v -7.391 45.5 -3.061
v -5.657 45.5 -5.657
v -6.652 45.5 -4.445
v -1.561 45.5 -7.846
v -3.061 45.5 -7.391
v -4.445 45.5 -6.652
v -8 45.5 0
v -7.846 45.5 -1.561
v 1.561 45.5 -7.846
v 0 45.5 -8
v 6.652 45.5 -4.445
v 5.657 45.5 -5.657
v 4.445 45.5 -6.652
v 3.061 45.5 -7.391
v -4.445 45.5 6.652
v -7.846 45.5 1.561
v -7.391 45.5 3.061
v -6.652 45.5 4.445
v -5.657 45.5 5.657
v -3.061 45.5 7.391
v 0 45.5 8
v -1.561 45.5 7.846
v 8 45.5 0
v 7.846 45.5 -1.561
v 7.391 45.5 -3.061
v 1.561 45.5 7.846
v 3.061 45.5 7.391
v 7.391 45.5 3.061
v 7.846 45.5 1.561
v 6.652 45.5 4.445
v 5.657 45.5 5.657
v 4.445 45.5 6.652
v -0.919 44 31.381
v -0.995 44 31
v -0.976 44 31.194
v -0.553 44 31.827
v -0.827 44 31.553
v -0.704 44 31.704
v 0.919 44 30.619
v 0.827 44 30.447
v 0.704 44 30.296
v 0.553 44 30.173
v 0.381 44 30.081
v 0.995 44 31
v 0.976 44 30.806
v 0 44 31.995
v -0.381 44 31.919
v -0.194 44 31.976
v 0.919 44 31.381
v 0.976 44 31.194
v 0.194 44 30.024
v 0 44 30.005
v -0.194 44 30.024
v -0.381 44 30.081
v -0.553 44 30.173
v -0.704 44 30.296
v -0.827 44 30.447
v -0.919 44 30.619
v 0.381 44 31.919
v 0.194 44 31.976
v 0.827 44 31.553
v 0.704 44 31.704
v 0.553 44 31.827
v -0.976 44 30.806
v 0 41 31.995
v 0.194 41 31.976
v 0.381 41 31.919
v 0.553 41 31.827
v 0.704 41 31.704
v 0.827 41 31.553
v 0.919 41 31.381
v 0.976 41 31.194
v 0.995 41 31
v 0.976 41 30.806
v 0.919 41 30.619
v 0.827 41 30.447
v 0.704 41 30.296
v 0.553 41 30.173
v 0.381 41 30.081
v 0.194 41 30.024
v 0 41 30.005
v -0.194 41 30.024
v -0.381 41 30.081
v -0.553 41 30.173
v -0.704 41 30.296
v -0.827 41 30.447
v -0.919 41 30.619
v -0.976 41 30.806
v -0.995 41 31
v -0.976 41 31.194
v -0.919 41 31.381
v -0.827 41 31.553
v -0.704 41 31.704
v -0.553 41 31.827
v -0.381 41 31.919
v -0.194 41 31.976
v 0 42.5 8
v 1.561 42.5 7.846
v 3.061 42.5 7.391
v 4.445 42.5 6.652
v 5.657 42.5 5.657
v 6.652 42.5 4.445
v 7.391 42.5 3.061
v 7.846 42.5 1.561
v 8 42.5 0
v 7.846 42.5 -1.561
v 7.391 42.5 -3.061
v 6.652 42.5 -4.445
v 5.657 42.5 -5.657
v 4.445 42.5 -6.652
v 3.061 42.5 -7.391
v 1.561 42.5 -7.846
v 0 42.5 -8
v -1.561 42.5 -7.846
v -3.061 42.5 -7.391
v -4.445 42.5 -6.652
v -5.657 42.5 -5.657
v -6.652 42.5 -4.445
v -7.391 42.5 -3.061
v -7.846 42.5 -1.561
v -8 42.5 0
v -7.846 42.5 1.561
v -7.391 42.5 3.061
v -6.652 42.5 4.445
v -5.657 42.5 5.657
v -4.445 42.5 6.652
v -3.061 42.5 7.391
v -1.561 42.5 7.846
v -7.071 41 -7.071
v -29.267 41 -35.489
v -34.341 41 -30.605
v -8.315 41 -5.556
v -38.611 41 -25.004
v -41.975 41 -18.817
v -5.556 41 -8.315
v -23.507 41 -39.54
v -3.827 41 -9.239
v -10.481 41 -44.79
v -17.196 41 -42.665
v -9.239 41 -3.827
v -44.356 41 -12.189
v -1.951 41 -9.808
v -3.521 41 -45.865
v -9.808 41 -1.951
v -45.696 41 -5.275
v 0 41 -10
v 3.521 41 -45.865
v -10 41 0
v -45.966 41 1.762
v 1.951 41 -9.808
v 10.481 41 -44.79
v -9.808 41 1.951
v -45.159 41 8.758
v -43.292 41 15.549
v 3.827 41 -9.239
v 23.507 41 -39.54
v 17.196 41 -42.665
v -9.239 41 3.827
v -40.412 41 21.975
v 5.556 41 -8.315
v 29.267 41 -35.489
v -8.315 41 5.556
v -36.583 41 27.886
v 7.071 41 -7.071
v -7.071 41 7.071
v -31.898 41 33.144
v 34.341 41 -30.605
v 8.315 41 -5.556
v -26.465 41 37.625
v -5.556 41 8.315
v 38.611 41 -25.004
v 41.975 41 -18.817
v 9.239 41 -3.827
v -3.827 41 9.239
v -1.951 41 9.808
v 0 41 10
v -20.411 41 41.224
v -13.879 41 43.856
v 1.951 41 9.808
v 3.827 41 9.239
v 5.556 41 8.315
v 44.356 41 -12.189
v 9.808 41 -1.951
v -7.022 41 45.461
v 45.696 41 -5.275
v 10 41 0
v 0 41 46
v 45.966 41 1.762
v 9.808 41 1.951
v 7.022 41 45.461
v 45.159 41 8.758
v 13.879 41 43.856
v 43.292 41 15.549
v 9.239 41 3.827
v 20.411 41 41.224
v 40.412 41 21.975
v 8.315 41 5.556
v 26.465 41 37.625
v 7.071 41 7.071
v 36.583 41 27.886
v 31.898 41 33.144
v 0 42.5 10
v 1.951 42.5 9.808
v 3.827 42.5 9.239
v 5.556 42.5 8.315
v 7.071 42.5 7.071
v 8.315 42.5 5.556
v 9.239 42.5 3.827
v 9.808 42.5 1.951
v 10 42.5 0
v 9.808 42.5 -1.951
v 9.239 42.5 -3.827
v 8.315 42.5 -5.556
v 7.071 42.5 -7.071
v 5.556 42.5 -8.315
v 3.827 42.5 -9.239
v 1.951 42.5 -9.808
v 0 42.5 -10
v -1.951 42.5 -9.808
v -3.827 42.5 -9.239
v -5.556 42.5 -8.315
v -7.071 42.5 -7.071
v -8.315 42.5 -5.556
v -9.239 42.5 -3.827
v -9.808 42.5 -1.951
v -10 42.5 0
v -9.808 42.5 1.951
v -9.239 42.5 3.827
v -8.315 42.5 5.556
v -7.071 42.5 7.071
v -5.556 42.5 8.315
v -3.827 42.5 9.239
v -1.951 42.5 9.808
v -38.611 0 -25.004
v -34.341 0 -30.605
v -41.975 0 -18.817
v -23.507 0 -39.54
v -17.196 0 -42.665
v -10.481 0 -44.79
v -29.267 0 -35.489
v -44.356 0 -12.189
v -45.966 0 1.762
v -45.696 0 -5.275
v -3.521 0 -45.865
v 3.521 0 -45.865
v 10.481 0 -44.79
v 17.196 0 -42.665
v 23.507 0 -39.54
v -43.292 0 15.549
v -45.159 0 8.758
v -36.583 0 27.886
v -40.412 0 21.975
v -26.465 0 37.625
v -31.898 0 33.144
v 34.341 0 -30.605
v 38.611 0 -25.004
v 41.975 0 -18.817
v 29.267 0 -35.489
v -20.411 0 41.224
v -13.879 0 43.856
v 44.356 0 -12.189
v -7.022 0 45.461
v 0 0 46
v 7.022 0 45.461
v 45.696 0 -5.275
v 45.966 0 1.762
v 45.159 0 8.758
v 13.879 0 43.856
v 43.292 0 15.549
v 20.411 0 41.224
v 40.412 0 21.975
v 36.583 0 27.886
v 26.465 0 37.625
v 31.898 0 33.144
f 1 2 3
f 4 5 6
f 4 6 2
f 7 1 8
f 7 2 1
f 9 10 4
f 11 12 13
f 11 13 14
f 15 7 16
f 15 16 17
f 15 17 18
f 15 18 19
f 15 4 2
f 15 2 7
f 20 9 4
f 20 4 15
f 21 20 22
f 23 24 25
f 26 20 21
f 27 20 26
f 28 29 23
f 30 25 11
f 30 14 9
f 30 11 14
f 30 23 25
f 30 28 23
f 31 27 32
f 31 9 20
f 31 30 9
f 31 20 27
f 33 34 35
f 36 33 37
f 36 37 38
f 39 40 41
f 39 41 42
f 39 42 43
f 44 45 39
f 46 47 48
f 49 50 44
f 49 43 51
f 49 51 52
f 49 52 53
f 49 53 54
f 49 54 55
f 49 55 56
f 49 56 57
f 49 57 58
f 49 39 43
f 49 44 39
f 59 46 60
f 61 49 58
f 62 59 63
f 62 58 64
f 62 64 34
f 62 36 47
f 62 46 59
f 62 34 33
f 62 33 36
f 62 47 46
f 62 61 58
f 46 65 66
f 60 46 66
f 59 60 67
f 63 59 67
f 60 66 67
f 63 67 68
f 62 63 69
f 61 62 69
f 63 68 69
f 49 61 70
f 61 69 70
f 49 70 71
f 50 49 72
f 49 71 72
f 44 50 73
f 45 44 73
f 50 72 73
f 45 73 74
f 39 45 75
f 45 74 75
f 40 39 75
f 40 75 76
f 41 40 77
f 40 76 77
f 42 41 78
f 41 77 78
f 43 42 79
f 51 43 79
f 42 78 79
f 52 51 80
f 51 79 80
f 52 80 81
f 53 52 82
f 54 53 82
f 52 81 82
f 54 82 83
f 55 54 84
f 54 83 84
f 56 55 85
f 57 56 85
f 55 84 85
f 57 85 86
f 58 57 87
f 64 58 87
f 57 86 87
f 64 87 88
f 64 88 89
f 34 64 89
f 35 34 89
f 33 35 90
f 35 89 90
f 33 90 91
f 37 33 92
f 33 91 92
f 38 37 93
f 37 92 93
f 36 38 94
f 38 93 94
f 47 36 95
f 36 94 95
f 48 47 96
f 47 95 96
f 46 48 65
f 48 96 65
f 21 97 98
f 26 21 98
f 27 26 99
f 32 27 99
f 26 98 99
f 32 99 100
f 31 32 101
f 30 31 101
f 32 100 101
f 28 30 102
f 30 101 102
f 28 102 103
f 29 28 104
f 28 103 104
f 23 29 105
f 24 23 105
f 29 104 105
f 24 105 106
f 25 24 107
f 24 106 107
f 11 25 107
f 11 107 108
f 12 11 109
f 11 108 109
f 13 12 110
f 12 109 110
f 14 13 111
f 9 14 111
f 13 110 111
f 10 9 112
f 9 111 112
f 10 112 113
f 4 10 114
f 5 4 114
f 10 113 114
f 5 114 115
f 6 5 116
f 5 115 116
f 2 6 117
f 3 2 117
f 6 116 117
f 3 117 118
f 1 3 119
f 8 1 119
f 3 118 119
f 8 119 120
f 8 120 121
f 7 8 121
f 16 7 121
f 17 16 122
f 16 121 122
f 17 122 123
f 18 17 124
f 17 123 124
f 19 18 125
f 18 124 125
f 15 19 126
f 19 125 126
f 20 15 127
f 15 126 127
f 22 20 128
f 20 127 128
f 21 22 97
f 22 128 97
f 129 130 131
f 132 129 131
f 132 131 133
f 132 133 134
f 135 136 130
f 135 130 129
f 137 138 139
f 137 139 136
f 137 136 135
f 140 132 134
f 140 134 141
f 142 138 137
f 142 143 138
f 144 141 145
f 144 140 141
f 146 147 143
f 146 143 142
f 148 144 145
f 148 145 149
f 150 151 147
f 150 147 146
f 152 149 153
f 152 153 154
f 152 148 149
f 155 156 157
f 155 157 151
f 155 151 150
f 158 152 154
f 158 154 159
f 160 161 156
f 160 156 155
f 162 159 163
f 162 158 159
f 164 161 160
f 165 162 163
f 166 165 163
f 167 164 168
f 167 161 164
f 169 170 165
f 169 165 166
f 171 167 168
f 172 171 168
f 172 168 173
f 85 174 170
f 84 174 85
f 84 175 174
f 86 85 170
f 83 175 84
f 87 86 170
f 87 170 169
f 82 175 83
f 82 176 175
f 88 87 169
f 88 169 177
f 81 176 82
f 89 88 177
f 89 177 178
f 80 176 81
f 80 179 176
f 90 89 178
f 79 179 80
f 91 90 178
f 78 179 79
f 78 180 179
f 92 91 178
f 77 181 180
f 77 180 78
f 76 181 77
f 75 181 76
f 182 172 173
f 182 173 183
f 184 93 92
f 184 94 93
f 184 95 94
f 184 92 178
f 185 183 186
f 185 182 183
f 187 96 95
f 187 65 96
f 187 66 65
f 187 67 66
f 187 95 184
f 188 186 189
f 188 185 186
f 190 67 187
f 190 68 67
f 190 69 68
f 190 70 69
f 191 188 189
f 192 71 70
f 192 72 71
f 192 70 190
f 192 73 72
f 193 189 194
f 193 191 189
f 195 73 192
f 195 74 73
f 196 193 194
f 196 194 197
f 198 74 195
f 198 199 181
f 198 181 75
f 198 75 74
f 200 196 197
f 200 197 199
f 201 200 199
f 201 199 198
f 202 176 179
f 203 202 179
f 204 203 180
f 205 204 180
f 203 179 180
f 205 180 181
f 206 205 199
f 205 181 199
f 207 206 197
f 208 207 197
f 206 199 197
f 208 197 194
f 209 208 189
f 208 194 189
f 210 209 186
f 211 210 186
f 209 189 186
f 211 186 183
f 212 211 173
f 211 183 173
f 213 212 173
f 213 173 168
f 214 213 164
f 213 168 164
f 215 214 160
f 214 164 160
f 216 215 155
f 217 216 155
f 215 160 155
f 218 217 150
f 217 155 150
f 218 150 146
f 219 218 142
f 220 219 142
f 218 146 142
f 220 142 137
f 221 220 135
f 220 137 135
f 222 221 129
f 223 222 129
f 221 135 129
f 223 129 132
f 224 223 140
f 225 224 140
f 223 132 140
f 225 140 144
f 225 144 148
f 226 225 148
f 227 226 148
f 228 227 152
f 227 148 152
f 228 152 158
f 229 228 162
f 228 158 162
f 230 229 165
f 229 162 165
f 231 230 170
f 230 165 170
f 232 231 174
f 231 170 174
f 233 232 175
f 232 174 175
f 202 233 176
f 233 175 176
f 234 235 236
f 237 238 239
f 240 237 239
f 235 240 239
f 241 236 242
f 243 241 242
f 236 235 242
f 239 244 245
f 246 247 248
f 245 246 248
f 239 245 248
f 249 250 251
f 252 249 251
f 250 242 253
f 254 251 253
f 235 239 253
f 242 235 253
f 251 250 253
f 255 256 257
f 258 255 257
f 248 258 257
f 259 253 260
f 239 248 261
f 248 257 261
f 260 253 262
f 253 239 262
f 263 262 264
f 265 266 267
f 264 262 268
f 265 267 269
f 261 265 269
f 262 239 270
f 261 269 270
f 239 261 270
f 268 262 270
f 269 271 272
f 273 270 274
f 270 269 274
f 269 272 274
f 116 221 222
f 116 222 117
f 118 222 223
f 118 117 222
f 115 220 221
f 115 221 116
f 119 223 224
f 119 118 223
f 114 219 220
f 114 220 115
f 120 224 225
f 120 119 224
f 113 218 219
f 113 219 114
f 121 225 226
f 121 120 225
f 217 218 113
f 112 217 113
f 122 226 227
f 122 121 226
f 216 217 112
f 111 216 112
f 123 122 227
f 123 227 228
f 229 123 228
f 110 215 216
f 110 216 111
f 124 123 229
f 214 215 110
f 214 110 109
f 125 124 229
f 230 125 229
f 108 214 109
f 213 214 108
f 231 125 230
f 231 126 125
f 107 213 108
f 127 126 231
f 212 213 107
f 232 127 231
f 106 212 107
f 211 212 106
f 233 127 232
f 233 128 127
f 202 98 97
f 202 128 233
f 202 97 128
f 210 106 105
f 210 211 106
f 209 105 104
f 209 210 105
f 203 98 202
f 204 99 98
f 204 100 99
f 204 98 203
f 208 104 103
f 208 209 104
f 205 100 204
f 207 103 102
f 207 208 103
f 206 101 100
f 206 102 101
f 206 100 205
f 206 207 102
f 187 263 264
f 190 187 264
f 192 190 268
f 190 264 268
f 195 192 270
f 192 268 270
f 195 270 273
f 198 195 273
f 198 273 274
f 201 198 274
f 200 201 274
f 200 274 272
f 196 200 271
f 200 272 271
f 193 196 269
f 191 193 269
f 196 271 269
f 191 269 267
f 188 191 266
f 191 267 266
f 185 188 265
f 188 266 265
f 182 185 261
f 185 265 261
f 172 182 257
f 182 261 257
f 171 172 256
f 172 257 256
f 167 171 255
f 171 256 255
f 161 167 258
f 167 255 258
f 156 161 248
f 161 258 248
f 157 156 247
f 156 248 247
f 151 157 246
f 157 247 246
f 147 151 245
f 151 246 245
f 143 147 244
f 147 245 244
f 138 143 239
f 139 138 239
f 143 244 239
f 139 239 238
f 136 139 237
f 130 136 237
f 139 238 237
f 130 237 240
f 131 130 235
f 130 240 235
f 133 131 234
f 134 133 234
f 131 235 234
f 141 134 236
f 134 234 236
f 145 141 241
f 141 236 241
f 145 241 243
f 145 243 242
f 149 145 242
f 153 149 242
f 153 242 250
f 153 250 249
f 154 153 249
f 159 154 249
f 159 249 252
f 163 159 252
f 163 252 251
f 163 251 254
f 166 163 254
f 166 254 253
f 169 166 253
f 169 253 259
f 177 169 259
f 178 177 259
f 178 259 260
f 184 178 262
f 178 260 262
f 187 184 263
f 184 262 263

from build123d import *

# Parameters (mm, degrees)
ESQUISSE1_R        = 46
BOSS_EXTRU_1_DEPTH = 41
ESQUISSE2_R        = 10
BOSS_EXTRU_2_DEPTH = 1.5
ESQUISSE3_R        = 8
BOSS_EXTRU_3_DEPTH = 3
ESQUISSE4_R        = 0.995
BOSS_EXTRU_4_DEPTH = 3


with BuildPart() as part:
    # Esquisse1 → Boss.-Extru.1 (new body)
    with BuildSketch(Plane(origin=(0, 0, 0), x_dir=(1, 0, 0), z_dir=(0, 1, 0))):
        with Locations(Location((0, 0, 0), (0, 0, 270))):
            Circle(ESQUISSE1_R)
    extrude(amount=BOSS_EXTRU_1_DEPTH)

    # Esquisse2 → Boss.-Extru.2 (add)
    with BuildSketch(Plane(origin=(0, 41, 0), x_dir=(1, 0, 0), z_dir=(0, 1, 0))):
        with Locations(Location((0, 0, 0), (0, 0, 270))):
            Circle(ESQUISSE2_R)
    extrude(amount=BOSS_EXTRU_2_DEPTH)

    # Esquisse3 → Boss.-Extru.3 (add)
    with BuildSketch(Plane(origin=(0, 42.5, 0), x_dir=(1, 0, 0), z_dir=(0, 1, 0))):
        with Locations(Location((0, 0, 0), (0, 0, 270))):
            Circle(ESQUISSE3_R)
    extrude(amount=BOSS_EXTRU_3_DEPTH)

    # Esquisse4 → Boss.-Extru.4 (add)
    with BuildSketch(Plane(origin=(0, 41, 0), x_dir=(1, 0, 0), z_dir=(0, 1, 0))):
        with Locations(Location((0, -31, 0), (0, 0, 270))):
            Circle(ESQUISSE4_R)
    extrude(amount=BOSS_EXTRU_4_DEPTH)


solid = part.part
